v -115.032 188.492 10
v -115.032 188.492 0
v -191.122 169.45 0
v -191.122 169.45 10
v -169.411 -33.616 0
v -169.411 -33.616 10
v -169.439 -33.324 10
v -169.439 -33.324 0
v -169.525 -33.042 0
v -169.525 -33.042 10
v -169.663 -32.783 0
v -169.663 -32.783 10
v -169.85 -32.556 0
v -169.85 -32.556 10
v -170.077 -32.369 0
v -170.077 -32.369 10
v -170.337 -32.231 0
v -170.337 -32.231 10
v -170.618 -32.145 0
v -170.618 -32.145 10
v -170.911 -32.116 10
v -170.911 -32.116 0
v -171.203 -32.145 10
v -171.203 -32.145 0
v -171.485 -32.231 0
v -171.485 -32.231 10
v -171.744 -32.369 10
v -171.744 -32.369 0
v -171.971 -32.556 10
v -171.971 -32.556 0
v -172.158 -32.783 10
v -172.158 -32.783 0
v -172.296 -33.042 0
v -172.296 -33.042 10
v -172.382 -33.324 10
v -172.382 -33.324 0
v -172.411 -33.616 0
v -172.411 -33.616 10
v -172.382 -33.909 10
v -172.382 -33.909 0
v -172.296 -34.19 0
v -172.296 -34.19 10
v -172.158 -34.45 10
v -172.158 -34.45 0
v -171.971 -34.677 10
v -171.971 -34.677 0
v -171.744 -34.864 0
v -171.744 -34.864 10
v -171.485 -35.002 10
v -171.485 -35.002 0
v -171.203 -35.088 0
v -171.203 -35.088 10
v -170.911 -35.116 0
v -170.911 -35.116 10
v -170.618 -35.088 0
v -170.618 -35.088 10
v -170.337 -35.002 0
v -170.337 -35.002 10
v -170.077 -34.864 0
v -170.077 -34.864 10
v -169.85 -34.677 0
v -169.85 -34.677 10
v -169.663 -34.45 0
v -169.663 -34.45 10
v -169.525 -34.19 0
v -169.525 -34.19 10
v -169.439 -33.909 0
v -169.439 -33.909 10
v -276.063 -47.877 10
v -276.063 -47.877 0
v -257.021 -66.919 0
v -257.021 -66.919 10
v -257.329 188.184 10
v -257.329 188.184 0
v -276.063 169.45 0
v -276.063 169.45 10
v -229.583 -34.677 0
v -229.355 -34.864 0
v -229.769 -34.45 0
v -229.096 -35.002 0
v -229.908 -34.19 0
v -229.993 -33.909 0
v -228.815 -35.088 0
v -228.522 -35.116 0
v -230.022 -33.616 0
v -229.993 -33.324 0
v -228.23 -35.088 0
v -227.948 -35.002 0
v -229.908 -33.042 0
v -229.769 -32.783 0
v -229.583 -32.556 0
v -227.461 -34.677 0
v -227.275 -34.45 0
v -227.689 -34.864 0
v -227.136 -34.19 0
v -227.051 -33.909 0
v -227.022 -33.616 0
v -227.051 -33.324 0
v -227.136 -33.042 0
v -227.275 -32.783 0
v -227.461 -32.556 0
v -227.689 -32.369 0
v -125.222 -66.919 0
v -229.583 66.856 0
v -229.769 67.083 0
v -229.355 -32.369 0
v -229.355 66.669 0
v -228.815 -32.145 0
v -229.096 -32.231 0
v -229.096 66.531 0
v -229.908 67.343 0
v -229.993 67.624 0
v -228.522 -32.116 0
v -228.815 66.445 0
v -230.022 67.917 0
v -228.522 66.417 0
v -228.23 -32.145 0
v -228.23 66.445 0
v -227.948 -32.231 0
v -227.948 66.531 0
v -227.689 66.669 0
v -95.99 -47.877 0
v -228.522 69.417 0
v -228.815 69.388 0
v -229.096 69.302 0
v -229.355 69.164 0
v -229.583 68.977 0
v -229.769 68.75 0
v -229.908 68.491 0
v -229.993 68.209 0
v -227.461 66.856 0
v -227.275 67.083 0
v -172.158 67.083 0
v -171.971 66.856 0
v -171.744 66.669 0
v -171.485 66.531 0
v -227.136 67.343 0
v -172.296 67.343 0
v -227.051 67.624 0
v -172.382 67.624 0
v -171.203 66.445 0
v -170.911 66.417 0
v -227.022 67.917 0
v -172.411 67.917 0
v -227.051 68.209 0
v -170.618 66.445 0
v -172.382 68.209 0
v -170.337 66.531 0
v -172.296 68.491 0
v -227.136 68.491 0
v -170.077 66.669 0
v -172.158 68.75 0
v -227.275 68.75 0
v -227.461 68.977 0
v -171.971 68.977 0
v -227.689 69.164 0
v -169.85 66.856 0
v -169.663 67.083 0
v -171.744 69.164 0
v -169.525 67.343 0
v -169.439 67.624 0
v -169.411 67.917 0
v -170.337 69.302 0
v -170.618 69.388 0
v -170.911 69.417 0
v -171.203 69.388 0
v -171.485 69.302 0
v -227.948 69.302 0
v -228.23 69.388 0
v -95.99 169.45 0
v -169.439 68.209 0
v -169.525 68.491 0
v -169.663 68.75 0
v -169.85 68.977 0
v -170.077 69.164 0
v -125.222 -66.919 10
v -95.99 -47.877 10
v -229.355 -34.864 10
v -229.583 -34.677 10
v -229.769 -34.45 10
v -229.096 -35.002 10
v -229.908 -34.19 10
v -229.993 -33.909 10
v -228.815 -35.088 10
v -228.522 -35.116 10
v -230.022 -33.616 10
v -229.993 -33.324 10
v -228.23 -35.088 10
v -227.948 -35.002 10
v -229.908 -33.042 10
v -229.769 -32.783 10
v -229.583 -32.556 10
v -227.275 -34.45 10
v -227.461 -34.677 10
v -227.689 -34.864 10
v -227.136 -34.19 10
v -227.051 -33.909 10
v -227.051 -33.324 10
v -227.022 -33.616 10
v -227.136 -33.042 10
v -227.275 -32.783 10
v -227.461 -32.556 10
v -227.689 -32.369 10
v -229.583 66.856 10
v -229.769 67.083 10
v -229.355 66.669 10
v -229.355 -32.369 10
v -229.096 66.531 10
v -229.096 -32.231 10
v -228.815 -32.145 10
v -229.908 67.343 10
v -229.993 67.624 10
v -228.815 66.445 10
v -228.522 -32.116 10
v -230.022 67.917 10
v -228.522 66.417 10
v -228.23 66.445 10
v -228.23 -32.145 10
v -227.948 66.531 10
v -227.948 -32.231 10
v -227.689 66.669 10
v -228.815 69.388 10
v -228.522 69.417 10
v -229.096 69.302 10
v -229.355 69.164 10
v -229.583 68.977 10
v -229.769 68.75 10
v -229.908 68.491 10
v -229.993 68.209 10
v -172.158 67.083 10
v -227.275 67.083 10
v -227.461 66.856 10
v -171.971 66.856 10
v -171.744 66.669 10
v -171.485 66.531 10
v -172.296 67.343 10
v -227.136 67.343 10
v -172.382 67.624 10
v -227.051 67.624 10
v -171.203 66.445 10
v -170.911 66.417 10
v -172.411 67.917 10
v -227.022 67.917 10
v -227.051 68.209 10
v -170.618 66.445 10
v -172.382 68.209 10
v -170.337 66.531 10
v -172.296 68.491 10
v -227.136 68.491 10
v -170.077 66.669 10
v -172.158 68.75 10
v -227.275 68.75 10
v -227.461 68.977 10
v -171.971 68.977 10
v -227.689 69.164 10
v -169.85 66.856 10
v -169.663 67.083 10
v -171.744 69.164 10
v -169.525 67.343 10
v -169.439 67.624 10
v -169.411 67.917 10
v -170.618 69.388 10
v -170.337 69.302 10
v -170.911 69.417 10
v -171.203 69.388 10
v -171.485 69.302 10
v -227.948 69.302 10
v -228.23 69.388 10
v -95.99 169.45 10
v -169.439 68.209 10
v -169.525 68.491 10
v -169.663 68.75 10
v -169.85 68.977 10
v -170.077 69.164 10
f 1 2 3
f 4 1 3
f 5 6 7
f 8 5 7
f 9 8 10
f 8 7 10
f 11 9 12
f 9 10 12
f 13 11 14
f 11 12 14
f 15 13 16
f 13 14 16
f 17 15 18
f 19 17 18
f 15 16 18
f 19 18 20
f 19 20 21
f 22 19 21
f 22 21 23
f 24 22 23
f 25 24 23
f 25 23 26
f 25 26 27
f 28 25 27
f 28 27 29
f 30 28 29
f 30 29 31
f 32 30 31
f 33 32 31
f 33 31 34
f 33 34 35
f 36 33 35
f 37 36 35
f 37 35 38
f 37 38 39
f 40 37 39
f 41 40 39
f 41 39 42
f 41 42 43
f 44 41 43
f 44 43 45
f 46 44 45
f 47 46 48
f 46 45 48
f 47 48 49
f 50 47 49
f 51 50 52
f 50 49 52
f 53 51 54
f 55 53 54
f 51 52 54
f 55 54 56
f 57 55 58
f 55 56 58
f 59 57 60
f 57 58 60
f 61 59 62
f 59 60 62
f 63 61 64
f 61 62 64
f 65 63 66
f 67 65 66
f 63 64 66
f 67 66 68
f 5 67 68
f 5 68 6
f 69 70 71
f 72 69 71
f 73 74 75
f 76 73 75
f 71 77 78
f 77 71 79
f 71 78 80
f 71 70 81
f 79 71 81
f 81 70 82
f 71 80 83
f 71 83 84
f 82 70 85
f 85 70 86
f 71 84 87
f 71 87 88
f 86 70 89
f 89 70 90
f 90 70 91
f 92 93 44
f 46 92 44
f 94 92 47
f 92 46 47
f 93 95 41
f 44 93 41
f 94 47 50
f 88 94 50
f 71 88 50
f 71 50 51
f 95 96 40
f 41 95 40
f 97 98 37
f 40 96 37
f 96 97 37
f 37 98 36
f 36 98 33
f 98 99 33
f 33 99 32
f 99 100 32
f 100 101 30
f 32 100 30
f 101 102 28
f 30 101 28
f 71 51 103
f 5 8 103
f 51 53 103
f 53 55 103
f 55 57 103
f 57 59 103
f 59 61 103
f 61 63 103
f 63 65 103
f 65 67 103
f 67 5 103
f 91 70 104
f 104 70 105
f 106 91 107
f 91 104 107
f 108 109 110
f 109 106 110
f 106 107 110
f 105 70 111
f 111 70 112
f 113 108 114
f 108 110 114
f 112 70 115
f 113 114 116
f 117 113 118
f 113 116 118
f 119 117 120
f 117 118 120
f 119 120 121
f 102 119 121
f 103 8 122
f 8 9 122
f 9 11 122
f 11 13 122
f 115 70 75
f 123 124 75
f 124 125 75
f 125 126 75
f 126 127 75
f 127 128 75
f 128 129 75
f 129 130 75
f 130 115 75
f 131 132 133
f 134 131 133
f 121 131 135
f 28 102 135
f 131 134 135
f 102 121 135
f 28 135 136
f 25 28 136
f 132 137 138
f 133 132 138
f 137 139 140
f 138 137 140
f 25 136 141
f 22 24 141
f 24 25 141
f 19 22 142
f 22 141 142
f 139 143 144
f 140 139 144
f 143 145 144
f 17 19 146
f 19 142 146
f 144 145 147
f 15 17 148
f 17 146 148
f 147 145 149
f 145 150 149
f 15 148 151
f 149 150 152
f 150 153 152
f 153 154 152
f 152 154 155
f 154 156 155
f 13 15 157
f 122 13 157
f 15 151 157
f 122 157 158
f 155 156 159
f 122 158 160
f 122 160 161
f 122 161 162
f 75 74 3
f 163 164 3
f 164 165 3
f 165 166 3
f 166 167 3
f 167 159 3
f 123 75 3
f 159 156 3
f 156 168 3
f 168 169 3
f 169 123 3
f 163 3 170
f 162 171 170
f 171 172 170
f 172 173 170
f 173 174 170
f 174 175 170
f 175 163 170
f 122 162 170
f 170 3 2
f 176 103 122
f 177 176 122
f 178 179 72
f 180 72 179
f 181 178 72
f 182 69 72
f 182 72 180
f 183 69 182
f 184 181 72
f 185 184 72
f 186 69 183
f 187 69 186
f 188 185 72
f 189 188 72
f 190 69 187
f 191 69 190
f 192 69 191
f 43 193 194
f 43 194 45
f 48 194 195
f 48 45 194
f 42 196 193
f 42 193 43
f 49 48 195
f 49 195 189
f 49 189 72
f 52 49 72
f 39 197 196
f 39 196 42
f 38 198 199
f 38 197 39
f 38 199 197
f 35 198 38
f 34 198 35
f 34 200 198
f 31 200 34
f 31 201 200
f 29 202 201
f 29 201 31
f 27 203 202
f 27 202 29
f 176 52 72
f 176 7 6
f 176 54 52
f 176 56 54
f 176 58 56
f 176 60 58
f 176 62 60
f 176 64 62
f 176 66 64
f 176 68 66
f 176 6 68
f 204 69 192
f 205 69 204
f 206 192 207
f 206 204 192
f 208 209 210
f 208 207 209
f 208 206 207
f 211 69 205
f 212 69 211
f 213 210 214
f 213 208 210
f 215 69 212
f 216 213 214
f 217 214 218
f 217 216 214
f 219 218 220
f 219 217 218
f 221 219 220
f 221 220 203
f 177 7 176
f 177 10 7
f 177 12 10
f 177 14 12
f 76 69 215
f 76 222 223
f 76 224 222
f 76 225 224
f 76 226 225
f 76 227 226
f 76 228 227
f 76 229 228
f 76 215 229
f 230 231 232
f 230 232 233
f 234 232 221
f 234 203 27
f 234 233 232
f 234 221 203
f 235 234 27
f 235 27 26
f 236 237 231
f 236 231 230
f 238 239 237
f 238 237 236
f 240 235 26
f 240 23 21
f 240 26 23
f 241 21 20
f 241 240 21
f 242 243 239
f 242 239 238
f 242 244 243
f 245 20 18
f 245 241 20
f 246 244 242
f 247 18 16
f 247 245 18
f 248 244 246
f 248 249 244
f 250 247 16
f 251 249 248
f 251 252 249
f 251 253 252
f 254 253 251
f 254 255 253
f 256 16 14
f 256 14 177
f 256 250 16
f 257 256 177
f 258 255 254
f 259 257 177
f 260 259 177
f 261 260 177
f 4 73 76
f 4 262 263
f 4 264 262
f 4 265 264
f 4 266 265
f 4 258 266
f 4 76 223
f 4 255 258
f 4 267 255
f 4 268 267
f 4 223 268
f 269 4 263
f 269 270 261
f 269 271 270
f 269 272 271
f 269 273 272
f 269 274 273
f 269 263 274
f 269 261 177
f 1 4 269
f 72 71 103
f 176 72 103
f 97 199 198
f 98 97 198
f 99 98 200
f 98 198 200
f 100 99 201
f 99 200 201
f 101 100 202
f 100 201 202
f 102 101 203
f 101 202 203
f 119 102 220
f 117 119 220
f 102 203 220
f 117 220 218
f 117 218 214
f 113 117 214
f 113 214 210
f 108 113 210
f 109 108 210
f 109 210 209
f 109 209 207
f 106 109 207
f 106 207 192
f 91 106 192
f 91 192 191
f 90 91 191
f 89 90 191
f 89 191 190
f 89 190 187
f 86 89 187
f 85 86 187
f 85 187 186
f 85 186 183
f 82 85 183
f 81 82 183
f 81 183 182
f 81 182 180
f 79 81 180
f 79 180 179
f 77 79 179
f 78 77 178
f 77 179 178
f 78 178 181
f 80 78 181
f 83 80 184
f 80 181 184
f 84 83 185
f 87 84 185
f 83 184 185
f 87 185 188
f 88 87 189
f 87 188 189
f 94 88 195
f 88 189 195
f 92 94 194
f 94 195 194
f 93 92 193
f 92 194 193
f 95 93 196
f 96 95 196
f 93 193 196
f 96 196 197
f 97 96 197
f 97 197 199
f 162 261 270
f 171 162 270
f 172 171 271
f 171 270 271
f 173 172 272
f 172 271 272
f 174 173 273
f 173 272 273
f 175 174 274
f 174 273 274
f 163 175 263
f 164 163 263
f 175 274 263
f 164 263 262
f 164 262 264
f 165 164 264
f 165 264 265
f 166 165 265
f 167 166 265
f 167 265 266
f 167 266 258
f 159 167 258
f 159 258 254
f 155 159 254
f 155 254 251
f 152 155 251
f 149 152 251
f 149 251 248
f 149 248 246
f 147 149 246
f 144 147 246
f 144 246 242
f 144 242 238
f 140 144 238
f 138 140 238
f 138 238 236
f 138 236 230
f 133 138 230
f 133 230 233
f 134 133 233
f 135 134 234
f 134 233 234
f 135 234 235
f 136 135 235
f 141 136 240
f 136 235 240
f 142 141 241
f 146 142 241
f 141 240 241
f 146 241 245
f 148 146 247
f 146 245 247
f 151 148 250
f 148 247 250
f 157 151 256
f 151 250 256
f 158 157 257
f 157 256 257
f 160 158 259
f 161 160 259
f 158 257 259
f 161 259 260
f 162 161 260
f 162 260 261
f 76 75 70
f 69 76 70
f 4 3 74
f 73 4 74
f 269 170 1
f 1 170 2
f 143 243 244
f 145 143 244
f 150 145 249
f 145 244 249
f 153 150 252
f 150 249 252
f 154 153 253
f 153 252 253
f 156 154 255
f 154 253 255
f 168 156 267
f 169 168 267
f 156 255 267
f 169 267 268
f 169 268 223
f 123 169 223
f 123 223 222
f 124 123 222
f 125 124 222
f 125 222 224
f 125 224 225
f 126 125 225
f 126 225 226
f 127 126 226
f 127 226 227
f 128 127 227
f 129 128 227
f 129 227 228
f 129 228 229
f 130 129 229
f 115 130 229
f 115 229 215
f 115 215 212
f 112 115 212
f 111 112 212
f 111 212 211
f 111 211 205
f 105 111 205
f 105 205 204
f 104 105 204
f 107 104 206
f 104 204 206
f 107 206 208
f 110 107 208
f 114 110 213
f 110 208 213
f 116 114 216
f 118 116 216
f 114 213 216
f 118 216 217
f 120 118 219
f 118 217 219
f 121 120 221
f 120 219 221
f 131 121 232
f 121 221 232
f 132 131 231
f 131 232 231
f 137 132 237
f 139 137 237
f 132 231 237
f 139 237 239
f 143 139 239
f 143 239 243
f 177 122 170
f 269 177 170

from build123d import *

# Parameters (mm, degrees)
EXTRUDE_2_DEPTH = 10
MM_1_D          = 3


with BuildPart() as part:
    # 草图3 → 凸台-拉伸2 (new body)
    with BuildSketch(Plane.XY):
        Polygon((-276.063392165, 169.449737011), (-276.063392165, -47.876740949), (-257.021298437, -66.918834677), (-125.22188191, -66.918834677), (-95.989685612, -47.876740949), (-95.989685612, 169.449737011), (-101.507171046, 174.967222445), (-115.03177934, 188.491830739), (-191.121590173, 169.449737011), (-257.328922186, 188.18420699), align=None)
    extrude(amount=EXTRUDE_2_DEPTH)

    # 大小mm 暗销孔1 (through all)
    with Locations(Plane(origin=(0, 0, 0), x_dir=(-1, 0, 0), z_dir=(0, 0, -1))):
        with Locations((170.910655251, 67.916631822), (228.522136285, 67.916631822), (228.522136285, -33.616473367), (170.910655251, -33.616473367)):
            Hole(MM_1_D / 2)


solid = part.part
